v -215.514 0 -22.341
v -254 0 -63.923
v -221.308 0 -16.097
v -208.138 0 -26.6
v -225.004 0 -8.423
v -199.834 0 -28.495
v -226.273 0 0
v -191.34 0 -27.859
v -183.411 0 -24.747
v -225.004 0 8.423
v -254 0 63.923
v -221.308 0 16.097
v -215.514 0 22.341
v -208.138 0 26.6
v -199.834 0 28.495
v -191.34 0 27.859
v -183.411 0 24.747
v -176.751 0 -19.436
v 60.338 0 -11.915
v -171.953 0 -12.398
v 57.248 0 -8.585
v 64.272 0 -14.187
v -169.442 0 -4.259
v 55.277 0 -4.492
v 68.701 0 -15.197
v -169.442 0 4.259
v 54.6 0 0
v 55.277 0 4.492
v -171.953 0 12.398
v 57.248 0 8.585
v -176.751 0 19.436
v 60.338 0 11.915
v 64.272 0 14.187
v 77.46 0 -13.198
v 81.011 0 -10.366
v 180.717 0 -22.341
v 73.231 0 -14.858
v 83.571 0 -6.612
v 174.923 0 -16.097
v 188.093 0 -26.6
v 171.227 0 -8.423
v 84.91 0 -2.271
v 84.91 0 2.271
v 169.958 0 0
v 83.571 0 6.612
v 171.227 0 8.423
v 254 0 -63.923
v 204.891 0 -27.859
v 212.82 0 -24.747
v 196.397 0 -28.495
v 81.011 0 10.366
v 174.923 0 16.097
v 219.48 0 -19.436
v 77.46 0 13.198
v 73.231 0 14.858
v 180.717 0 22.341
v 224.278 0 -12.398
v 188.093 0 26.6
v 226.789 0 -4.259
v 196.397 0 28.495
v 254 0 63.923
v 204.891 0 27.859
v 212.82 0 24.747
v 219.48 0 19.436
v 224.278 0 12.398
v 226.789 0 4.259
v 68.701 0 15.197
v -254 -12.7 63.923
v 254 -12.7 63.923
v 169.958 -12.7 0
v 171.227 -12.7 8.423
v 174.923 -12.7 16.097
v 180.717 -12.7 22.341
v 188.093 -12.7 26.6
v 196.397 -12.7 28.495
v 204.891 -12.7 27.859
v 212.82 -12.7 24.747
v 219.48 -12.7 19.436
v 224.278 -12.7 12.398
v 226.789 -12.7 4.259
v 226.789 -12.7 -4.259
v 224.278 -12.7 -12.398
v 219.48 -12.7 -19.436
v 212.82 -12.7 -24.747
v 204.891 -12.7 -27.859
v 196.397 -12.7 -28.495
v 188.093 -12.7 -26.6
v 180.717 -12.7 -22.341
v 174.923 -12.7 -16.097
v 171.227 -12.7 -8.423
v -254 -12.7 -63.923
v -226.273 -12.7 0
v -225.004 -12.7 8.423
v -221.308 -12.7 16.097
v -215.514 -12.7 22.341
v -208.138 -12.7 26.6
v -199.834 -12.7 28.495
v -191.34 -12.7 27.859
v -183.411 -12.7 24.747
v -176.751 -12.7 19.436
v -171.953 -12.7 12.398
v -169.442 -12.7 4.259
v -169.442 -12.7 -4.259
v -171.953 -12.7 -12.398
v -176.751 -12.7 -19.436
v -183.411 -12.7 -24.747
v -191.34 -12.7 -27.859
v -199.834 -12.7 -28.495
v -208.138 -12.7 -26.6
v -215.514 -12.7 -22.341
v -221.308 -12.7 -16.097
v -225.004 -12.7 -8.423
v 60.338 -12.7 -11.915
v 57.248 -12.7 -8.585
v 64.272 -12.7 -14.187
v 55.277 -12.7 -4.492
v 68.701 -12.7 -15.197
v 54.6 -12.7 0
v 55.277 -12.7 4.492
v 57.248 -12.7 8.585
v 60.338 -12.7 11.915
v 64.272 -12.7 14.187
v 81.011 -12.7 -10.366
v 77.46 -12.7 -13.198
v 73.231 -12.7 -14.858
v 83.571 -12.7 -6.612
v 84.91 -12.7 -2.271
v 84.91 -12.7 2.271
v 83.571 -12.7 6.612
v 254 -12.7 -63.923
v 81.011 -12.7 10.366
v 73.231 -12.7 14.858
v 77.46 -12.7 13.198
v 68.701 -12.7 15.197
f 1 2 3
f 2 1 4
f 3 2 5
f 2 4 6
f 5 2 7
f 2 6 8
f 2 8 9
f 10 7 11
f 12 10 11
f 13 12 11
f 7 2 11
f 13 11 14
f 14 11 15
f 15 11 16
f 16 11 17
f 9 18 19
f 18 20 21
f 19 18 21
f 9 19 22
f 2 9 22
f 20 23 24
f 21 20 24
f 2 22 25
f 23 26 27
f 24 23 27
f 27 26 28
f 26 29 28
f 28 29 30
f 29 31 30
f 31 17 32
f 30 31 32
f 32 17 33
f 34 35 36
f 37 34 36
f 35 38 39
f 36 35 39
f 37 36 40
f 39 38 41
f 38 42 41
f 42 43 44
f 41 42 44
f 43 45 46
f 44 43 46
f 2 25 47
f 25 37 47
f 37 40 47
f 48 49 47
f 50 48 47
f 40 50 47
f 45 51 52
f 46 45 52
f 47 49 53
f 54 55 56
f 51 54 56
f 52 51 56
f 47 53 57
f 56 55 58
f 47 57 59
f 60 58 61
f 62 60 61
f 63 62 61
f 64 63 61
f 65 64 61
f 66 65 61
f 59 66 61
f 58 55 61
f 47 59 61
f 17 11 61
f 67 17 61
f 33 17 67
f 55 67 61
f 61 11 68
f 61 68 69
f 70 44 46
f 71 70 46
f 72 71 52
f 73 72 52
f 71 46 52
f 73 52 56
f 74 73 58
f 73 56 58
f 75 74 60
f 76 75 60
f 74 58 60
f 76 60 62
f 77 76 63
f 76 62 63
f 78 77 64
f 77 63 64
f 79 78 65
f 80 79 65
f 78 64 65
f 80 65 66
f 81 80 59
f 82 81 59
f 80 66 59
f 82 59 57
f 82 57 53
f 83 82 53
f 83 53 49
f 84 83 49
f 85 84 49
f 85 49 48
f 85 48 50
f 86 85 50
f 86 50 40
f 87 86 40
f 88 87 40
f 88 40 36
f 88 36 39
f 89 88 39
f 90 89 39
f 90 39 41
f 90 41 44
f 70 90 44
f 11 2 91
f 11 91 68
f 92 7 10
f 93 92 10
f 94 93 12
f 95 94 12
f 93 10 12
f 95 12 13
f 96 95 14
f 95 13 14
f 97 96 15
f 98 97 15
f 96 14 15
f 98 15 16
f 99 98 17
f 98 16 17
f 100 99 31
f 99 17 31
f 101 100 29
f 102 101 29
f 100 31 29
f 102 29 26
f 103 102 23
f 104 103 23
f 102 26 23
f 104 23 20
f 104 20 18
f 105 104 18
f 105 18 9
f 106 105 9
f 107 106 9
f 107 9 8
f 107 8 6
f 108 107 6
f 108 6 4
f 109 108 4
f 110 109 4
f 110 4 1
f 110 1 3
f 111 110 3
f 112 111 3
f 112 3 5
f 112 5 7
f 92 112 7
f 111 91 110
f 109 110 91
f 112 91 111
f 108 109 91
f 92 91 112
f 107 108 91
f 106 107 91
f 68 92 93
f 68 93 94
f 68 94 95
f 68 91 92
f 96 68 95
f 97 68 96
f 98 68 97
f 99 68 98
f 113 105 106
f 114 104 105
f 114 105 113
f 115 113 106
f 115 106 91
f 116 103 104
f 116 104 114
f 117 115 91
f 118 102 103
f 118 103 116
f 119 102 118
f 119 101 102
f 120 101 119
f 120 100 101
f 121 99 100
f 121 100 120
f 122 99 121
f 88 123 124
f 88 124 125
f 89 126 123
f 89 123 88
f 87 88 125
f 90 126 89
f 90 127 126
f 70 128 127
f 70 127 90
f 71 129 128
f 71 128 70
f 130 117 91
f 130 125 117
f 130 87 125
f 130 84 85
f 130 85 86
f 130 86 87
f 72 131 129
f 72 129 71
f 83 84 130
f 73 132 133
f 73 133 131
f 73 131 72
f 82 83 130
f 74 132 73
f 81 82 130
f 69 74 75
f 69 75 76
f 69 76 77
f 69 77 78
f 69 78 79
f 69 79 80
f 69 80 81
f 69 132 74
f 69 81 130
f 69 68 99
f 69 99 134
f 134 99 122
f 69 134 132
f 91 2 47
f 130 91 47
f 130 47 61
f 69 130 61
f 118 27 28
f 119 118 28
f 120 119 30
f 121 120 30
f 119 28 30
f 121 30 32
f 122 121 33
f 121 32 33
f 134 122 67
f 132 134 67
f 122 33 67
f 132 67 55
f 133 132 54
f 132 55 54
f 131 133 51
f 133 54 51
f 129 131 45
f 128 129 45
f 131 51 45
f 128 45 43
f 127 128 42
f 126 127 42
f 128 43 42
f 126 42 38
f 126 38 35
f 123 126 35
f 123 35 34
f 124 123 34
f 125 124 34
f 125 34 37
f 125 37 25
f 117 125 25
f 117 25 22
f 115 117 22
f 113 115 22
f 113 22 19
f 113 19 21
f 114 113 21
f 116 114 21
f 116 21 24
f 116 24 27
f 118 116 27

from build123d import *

# Parameters (mm, degrees)
F0_W     = 508
F0_H     = 127.845764
F1_DEPTH = 12.7
F3_D     = 57.15
F5_D     = 30.48


with BuildPart() as f1:
    # F0 (on Front) → F1 (new body)
    with BuildSketch(Plane.XZ):
        Rectangle(F0_W, F0_H)
    extrude(amount=F1_DEPTH)

    # F3 (through all)
    with Locations(Plane.XZ.offset(12.7)):
        with Locations((-197.69825, 0), (198.532864, 0)):
            Hole(F3_D / 2)

    # F5 (through all)
    with Locations(Plane.XZ.offset(12.7)):
        with Locations((69.839768, 0)):
            Hole(F5_D / 2)


solid = f1.part
